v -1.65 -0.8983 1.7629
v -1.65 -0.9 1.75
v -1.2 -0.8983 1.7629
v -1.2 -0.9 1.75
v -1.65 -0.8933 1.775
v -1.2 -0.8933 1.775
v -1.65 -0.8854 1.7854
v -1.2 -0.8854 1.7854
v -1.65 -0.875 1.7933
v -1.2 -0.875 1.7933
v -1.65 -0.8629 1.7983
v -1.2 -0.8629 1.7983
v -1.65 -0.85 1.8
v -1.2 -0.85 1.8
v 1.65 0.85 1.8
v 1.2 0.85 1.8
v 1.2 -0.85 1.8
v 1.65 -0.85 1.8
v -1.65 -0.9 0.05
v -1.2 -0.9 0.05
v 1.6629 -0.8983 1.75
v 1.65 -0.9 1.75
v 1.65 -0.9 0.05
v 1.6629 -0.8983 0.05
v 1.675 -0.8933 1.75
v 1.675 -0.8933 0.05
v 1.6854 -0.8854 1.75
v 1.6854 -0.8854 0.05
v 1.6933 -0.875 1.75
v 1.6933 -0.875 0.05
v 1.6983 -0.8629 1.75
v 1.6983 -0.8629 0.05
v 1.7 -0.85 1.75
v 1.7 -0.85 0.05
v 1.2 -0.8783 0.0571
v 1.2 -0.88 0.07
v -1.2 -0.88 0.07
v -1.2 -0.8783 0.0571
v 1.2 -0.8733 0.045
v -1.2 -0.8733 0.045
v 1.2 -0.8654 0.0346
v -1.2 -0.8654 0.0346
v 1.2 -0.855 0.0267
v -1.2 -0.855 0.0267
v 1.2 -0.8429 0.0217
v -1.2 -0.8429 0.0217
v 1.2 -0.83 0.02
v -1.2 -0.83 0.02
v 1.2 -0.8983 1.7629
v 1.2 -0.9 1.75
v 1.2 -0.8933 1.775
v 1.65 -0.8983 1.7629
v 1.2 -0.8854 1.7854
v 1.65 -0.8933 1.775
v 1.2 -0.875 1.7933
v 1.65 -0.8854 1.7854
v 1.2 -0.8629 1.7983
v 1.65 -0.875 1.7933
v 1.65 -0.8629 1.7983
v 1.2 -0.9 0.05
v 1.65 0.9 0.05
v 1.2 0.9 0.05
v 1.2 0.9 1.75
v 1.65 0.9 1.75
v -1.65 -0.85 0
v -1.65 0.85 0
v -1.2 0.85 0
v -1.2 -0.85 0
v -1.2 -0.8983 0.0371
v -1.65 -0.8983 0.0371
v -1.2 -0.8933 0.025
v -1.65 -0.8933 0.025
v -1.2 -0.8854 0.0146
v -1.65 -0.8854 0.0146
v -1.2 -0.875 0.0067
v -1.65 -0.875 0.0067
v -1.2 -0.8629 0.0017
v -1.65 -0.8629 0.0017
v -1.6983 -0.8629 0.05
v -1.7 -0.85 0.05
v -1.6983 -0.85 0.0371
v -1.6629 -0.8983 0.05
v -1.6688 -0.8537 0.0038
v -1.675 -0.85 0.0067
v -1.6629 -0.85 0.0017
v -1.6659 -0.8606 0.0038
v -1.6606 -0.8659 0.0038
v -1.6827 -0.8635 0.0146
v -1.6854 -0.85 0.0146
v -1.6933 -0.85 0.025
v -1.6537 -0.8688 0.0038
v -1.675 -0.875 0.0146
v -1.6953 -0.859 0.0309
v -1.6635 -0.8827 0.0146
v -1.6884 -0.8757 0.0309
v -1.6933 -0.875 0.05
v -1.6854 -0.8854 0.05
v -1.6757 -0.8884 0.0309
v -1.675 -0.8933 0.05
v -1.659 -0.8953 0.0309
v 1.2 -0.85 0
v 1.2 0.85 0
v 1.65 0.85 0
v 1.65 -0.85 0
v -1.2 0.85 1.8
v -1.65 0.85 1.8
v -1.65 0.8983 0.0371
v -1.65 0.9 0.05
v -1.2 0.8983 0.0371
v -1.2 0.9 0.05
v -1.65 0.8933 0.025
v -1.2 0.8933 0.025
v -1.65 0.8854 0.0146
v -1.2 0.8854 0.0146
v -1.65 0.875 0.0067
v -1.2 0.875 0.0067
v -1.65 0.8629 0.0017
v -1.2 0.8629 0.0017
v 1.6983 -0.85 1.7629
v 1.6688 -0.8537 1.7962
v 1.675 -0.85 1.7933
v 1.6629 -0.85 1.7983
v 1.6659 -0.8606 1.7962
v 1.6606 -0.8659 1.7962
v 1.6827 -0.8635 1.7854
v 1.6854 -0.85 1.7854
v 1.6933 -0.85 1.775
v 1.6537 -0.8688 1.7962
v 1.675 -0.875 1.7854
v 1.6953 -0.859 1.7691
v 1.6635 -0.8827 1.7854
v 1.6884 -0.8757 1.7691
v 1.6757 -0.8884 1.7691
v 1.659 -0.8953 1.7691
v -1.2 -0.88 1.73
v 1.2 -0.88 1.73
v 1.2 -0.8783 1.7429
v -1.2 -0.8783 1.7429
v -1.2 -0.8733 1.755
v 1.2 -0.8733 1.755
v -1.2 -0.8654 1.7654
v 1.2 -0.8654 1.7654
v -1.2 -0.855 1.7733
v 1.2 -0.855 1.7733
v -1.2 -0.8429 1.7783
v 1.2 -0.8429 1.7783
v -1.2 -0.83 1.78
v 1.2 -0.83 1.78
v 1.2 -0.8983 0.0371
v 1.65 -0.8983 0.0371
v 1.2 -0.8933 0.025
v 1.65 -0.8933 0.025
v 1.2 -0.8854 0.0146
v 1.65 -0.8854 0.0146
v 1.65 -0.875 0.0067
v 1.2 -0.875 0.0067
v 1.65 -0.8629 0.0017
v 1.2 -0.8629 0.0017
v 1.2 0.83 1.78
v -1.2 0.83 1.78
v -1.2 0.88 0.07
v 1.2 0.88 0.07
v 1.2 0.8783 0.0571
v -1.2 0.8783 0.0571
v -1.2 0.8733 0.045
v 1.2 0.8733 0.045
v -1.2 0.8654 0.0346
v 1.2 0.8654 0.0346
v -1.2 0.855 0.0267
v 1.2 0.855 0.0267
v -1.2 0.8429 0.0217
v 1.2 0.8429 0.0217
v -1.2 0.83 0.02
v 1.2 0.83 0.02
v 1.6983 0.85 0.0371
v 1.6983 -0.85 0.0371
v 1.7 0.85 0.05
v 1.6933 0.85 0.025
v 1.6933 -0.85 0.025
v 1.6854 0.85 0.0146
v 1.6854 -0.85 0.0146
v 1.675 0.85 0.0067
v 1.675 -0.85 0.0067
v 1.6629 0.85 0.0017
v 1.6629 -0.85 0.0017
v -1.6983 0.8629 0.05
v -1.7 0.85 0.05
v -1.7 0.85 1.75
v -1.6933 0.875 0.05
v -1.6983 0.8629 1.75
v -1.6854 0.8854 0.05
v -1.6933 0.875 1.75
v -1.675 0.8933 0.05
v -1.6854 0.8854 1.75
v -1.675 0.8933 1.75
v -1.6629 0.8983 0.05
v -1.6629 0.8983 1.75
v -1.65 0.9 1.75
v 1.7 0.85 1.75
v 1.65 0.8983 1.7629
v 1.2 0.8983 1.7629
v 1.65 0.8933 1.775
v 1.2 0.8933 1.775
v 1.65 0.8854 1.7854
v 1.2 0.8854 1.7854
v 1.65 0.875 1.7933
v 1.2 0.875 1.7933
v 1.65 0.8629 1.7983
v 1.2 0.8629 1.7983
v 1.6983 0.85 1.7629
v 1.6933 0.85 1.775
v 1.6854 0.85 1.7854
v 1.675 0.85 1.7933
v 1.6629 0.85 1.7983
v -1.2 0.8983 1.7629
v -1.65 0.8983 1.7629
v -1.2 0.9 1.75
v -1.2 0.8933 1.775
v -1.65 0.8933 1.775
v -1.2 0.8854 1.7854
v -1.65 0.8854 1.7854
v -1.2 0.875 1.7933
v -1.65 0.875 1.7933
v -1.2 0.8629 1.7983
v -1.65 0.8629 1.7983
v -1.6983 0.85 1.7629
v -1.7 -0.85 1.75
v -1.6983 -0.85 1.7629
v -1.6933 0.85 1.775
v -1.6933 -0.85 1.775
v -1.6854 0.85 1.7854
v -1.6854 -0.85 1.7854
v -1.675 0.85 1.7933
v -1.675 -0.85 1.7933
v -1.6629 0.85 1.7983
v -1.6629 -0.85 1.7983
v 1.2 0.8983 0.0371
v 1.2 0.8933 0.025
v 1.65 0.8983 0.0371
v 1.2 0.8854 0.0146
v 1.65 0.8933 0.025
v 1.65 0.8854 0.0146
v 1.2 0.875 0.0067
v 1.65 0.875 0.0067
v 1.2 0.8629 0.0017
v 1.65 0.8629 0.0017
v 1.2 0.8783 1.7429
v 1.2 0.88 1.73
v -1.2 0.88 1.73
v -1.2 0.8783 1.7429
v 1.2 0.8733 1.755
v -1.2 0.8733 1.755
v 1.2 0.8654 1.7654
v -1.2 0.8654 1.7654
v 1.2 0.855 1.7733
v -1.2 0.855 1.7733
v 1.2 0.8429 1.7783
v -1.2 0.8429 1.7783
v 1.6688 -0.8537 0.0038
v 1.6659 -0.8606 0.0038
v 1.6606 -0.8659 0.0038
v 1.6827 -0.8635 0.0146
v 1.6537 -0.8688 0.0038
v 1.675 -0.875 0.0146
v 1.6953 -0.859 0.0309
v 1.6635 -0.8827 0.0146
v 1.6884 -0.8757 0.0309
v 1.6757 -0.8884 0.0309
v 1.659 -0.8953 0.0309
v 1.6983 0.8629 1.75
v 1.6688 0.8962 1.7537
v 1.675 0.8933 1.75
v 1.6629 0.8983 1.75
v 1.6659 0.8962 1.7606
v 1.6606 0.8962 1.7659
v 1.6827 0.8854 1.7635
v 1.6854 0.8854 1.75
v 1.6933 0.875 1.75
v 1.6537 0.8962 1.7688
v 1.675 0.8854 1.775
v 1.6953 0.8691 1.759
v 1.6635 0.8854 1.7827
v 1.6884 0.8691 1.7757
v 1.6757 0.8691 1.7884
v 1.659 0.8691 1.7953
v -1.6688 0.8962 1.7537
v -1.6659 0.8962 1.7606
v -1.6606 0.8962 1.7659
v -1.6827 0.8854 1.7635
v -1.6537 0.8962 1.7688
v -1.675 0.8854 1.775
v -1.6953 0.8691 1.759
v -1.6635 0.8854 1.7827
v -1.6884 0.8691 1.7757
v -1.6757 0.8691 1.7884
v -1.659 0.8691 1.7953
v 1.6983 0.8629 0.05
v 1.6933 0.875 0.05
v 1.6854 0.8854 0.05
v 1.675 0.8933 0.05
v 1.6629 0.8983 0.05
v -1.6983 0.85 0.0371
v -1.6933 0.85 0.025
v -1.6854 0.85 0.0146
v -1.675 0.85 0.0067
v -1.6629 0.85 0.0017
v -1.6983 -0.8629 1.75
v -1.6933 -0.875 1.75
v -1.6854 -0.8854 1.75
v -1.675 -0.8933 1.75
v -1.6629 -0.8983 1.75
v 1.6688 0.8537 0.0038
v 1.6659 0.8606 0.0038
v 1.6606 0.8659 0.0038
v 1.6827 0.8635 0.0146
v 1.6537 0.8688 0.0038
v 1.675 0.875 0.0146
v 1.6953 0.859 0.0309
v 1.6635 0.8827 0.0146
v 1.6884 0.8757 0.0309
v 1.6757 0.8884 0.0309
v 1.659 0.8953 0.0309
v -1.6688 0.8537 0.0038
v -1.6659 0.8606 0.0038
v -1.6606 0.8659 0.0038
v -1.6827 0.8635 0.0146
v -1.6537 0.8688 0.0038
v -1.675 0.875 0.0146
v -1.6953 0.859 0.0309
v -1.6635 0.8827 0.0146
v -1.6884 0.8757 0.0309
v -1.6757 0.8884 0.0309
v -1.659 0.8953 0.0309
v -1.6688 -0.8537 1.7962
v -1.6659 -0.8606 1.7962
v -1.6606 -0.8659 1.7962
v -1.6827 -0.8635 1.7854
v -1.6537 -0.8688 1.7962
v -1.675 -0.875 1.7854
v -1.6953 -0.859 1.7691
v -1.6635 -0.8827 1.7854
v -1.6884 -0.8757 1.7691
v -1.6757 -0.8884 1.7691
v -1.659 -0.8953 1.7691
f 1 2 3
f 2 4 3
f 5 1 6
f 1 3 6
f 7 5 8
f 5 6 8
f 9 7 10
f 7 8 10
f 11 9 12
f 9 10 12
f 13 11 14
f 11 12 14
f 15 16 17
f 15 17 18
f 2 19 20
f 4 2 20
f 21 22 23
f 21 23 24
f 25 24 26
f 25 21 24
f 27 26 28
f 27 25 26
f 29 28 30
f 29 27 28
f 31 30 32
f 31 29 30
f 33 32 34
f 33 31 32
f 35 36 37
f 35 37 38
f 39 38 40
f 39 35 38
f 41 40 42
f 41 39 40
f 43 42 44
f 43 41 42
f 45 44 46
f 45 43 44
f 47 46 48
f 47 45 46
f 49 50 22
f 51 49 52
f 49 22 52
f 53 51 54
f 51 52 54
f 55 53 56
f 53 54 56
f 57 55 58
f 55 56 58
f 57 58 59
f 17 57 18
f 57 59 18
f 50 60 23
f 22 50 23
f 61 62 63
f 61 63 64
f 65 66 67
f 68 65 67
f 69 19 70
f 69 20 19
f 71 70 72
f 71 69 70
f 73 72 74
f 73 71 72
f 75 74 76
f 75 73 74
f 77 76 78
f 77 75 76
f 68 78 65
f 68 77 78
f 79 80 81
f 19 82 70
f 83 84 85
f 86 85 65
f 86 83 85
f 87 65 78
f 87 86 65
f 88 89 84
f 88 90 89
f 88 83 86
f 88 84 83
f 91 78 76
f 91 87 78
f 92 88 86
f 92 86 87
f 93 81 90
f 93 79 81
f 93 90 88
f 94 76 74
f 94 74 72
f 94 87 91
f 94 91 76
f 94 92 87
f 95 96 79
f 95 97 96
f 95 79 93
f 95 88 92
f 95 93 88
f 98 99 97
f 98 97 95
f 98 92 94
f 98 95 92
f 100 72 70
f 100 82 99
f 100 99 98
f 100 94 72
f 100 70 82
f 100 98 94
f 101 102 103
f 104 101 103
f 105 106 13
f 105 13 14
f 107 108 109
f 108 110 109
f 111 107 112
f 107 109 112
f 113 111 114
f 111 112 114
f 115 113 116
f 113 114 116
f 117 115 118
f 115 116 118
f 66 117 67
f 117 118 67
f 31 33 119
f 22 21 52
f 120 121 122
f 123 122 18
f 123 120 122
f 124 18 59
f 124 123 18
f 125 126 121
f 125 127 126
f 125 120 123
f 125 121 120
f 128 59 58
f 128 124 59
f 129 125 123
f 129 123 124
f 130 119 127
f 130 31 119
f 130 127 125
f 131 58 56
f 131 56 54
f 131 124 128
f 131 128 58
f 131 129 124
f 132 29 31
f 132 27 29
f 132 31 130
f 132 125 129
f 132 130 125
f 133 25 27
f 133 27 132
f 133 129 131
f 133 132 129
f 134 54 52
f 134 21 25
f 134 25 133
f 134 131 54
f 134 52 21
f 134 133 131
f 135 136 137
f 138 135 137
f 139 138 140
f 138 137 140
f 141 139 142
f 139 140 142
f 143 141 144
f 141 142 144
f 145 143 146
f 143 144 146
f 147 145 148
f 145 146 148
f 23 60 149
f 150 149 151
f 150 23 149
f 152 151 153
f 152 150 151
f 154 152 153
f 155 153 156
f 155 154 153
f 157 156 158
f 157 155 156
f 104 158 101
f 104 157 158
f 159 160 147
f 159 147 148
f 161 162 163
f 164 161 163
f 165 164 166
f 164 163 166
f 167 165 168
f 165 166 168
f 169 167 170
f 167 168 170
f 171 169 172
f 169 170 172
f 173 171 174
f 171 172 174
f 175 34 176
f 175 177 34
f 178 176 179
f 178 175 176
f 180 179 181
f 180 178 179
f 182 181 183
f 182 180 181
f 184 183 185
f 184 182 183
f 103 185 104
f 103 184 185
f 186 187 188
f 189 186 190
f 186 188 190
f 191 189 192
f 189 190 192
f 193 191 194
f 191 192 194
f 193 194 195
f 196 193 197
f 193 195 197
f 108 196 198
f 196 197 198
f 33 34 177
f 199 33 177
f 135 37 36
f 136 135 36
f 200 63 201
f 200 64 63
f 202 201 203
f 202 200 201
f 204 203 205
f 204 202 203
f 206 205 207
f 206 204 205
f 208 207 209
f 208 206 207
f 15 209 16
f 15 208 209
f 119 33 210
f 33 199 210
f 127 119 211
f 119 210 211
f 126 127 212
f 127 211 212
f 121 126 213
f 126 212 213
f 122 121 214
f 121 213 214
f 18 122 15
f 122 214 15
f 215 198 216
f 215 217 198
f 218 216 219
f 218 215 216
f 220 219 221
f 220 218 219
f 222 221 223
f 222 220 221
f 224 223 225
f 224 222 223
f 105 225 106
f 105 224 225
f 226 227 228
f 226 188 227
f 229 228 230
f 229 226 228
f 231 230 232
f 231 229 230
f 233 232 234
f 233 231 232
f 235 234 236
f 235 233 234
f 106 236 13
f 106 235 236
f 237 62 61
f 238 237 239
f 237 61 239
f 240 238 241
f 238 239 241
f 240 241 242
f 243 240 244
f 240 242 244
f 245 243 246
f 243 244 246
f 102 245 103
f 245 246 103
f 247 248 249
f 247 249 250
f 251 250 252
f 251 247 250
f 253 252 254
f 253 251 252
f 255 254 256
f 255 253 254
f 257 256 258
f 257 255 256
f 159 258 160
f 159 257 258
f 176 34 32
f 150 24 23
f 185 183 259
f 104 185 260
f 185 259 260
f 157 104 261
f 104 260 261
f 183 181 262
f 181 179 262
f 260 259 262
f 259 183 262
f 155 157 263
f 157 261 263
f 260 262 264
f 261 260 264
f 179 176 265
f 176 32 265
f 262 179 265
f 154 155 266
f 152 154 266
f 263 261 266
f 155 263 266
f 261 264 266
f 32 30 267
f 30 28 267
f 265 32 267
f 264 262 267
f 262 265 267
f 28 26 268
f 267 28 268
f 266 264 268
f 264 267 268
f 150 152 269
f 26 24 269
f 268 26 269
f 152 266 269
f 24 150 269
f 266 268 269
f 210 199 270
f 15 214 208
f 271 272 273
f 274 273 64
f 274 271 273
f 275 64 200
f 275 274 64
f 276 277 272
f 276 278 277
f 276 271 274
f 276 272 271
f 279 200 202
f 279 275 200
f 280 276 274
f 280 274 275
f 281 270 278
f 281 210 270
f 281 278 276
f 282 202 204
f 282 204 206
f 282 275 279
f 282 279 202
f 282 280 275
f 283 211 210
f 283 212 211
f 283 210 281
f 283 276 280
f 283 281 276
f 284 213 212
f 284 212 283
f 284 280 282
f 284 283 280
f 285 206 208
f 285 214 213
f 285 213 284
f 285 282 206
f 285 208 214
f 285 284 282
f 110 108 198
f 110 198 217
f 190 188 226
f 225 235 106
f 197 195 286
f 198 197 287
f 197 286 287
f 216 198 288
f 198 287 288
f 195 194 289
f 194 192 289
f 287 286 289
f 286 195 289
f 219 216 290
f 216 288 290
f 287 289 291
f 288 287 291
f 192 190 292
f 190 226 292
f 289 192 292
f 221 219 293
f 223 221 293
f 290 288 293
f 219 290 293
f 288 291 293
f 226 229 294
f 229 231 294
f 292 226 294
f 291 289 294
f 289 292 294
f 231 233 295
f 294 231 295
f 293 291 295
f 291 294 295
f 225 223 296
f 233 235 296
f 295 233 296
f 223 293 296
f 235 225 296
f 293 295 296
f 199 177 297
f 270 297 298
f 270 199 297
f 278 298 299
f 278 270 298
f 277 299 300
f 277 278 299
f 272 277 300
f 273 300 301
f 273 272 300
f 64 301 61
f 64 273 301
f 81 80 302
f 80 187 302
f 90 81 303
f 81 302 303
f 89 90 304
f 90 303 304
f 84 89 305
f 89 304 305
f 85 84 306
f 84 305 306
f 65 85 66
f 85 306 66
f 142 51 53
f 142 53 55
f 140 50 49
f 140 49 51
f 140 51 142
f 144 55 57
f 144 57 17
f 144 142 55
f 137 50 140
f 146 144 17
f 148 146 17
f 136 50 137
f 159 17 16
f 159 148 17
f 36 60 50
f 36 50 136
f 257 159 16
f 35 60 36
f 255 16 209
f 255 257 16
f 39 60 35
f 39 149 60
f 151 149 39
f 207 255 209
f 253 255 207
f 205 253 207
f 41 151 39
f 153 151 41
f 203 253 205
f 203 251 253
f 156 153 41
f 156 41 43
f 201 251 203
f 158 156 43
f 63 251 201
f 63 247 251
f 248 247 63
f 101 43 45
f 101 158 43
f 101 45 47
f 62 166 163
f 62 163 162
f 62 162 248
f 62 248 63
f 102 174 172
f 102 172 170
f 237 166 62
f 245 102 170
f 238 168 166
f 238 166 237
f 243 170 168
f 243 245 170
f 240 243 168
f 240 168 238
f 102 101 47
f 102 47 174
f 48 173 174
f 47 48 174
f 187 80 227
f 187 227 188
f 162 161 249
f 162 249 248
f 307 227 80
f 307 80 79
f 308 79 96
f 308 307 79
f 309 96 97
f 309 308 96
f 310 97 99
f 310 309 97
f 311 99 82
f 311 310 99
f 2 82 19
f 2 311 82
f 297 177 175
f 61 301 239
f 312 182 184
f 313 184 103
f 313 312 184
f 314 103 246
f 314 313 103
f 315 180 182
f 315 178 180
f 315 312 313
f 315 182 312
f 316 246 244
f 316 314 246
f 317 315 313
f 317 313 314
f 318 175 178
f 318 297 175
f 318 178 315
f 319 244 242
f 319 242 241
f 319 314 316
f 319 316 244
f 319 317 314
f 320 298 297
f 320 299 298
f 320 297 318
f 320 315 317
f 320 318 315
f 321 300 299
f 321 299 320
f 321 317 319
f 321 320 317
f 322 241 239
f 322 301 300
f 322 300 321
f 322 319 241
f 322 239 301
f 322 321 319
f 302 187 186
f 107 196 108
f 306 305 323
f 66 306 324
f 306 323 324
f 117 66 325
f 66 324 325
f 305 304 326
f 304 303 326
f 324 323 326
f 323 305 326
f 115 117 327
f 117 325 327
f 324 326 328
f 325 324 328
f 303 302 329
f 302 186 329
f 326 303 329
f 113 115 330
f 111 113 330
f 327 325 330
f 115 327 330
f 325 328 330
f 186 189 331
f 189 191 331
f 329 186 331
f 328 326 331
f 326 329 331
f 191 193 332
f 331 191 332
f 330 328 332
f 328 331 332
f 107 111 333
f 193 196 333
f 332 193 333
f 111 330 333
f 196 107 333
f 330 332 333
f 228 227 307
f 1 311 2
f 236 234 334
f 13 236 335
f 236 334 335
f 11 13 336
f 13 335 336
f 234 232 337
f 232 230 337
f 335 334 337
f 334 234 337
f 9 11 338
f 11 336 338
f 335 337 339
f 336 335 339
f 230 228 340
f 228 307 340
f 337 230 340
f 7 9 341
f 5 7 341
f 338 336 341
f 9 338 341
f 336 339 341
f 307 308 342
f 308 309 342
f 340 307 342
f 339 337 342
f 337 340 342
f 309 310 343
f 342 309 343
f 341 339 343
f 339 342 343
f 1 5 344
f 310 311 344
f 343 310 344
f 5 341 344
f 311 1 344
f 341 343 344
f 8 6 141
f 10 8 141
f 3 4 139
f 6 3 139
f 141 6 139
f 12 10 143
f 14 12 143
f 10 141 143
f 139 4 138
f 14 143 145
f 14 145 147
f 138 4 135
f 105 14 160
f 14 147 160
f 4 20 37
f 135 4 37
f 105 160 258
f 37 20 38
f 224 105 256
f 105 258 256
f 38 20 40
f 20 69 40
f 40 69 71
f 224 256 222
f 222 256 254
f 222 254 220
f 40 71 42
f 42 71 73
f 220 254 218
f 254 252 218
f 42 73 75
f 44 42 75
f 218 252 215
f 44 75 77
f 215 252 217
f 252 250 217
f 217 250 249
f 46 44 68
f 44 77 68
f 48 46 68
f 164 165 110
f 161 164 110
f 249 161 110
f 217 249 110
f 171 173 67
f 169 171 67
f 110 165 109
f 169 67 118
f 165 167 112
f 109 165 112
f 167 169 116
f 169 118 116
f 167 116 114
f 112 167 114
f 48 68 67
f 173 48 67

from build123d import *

# Parameters (mm, degrees)
PLATING_LEFT_W      = 0.5
PLATING_LEFT_H      = 1.8
PLATING_LEFT_DEPTH  = 1.8
PLATING_LEFT_F_R    = 0.05
PLATING_RIGHT_W     = 0.5
PLATING_RIGHT_H     = 1.8
PLATING_RIGHT_DEPTH = 1.8
PLATING_RIGHT_F_R   = 0.05
CHIP_W              = 3.36
CHIP_H              = 1.76
CHIP_DEPTH          = 1.76
CHIP_F_R            = 0.05


with BuildPart() as plating_left_f:
    # plating_left → plating_left (new body)
    with BuildSketch(Plane(origin=(-1.7, -0.9, 0), x_dir=(1, 0, 0), z_dir=(0, 0, 1))):
        with Locations((0.25, 0.9)):
            Rectangle(PLATING_LEFT_W, PLATING_LEFT_H)
    extrude(amount=PLATING_LEFT_DEPTH)

    # plating_left_f
    plating_left_f_edges = [plating_left_f.edges().sort_by_distance(p)[0] for p in [
        (-1.7, -0.9, 0.9),
        (-1.7, 0, 1.8),
        (-1.7, 0.9, 0.9),
        (-1.7, 0, 0),
        (-1.45, -0.9, 0),
        (-1.45, -0.9, 1.8),
        (-1.45, 0.9, 0),
        (-1.45, 0.9, 1.8),
    ]]
    fillet(plating_left_f_edges, radius=PLATING_LEFT_F_R)


with BuildPart() as plating_right_f:
    # plating_right → plating_right (new body)
    with BuildSketch(Plane(origin=(1.2, -0.9, 0), x_dir=(1, 0, 0), z_dir=(0, 0, 1))):
        with Locations((0.25, 0.9)):
            Rectangle(PLATING_RIGHT_W, PLATING_RIGHT_H)
    extrude(amount=PLATING_RIGHT_DEPTH)

    # plating_right_f
    plating_right_f_edges = [plating_right_f.edges().sort_by_distance(p)[0] for p in [
        (1.7, -0.9, 0.9),
        (1.7, 0, 1.8),
        (1.7, 0.9, 0.9),
        (1.7, 0, 0),
        (1.45, -0.9, 0),
        (1.45, -0.9, 1.8),
        (1.45, 0.9, 0),
        (1.45, 0.9, 1.8),
    ]]
    fillet(plating_right_f_edges, radius=PLATING_RIGHT_F_R)


with BuildPart() as capacitor:
    # chip → chip (new body)
    with BuildSketch(Plane(origin=(-1.68, -0.88, 0.02), x_dir=(1, 0, 0), z_dir=(0, 0, 1))):
        with Locations((1.68, 0.88)):
            Rectangle(CHIP_W, CHIP_H)
    extrude(amount=CHIP_DEPTH)

    # chip_f
    chip_f_edges = [capacitor.edges().sort_by_distance(p)[0] for p in [
        (0, -0.88, 0.02),
        (0, -0.88, 1.78),
        (0, 0.88, 0.02),
        (0, 0.88, 1.78),
    ]]
    fillet(chip_f_edges, radius=CHIP_F_R)

    # capacitor: union plating_left_f, plating_right_f
    add(plating_left_f.part)
    add(plating_right_f.part)


solid = capacitor.part
